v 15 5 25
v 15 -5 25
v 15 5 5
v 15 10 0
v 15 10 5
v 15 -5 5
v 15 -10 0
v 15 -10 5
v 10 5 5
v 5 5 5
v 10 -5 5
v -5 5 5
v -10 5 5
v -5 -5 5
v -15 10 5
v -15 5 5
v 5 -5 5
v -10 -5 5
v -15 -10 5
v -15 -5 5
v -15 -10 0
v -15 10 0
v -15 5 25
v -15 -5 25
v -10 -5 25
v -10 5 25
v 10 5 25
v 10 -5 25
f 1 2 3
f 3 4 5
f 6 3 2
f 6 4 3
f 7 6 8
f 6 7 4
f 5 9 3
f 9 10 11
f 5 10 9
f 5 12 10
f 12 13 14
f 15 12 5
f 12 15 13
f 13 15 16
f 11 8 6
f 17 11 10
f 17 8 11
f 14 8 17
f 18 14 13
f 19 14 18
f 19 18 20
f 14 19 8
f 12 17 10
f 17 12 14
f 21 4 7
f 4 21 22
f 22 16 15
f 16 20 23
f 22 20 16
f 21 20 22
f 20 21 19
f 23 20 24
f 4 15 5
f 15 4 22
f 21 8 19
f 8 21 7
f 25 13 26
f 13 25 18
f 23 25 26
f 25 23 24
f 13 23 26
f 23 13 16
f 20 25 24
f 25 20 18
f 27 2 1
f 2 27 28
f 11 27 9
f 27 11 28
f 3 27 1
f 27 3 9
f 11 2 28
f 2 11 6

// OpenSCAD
module photo_interrupter() {
    difference() {
        union() {
            // Base block
            translate([-15, -10, 0])
            cube([30, 20, 5]);

            // Left arm
            translate([-15, -5, 5])
            cube([5, 10, 20]);

            // Right arm
            translate([10, -5, 5])
            cube([5, 10, 20]);
        }

        // Slot for interruption
        translate([-5, -5, 5])
        cube([10, 10, 20]);
    }
}

photo_interrupter();
